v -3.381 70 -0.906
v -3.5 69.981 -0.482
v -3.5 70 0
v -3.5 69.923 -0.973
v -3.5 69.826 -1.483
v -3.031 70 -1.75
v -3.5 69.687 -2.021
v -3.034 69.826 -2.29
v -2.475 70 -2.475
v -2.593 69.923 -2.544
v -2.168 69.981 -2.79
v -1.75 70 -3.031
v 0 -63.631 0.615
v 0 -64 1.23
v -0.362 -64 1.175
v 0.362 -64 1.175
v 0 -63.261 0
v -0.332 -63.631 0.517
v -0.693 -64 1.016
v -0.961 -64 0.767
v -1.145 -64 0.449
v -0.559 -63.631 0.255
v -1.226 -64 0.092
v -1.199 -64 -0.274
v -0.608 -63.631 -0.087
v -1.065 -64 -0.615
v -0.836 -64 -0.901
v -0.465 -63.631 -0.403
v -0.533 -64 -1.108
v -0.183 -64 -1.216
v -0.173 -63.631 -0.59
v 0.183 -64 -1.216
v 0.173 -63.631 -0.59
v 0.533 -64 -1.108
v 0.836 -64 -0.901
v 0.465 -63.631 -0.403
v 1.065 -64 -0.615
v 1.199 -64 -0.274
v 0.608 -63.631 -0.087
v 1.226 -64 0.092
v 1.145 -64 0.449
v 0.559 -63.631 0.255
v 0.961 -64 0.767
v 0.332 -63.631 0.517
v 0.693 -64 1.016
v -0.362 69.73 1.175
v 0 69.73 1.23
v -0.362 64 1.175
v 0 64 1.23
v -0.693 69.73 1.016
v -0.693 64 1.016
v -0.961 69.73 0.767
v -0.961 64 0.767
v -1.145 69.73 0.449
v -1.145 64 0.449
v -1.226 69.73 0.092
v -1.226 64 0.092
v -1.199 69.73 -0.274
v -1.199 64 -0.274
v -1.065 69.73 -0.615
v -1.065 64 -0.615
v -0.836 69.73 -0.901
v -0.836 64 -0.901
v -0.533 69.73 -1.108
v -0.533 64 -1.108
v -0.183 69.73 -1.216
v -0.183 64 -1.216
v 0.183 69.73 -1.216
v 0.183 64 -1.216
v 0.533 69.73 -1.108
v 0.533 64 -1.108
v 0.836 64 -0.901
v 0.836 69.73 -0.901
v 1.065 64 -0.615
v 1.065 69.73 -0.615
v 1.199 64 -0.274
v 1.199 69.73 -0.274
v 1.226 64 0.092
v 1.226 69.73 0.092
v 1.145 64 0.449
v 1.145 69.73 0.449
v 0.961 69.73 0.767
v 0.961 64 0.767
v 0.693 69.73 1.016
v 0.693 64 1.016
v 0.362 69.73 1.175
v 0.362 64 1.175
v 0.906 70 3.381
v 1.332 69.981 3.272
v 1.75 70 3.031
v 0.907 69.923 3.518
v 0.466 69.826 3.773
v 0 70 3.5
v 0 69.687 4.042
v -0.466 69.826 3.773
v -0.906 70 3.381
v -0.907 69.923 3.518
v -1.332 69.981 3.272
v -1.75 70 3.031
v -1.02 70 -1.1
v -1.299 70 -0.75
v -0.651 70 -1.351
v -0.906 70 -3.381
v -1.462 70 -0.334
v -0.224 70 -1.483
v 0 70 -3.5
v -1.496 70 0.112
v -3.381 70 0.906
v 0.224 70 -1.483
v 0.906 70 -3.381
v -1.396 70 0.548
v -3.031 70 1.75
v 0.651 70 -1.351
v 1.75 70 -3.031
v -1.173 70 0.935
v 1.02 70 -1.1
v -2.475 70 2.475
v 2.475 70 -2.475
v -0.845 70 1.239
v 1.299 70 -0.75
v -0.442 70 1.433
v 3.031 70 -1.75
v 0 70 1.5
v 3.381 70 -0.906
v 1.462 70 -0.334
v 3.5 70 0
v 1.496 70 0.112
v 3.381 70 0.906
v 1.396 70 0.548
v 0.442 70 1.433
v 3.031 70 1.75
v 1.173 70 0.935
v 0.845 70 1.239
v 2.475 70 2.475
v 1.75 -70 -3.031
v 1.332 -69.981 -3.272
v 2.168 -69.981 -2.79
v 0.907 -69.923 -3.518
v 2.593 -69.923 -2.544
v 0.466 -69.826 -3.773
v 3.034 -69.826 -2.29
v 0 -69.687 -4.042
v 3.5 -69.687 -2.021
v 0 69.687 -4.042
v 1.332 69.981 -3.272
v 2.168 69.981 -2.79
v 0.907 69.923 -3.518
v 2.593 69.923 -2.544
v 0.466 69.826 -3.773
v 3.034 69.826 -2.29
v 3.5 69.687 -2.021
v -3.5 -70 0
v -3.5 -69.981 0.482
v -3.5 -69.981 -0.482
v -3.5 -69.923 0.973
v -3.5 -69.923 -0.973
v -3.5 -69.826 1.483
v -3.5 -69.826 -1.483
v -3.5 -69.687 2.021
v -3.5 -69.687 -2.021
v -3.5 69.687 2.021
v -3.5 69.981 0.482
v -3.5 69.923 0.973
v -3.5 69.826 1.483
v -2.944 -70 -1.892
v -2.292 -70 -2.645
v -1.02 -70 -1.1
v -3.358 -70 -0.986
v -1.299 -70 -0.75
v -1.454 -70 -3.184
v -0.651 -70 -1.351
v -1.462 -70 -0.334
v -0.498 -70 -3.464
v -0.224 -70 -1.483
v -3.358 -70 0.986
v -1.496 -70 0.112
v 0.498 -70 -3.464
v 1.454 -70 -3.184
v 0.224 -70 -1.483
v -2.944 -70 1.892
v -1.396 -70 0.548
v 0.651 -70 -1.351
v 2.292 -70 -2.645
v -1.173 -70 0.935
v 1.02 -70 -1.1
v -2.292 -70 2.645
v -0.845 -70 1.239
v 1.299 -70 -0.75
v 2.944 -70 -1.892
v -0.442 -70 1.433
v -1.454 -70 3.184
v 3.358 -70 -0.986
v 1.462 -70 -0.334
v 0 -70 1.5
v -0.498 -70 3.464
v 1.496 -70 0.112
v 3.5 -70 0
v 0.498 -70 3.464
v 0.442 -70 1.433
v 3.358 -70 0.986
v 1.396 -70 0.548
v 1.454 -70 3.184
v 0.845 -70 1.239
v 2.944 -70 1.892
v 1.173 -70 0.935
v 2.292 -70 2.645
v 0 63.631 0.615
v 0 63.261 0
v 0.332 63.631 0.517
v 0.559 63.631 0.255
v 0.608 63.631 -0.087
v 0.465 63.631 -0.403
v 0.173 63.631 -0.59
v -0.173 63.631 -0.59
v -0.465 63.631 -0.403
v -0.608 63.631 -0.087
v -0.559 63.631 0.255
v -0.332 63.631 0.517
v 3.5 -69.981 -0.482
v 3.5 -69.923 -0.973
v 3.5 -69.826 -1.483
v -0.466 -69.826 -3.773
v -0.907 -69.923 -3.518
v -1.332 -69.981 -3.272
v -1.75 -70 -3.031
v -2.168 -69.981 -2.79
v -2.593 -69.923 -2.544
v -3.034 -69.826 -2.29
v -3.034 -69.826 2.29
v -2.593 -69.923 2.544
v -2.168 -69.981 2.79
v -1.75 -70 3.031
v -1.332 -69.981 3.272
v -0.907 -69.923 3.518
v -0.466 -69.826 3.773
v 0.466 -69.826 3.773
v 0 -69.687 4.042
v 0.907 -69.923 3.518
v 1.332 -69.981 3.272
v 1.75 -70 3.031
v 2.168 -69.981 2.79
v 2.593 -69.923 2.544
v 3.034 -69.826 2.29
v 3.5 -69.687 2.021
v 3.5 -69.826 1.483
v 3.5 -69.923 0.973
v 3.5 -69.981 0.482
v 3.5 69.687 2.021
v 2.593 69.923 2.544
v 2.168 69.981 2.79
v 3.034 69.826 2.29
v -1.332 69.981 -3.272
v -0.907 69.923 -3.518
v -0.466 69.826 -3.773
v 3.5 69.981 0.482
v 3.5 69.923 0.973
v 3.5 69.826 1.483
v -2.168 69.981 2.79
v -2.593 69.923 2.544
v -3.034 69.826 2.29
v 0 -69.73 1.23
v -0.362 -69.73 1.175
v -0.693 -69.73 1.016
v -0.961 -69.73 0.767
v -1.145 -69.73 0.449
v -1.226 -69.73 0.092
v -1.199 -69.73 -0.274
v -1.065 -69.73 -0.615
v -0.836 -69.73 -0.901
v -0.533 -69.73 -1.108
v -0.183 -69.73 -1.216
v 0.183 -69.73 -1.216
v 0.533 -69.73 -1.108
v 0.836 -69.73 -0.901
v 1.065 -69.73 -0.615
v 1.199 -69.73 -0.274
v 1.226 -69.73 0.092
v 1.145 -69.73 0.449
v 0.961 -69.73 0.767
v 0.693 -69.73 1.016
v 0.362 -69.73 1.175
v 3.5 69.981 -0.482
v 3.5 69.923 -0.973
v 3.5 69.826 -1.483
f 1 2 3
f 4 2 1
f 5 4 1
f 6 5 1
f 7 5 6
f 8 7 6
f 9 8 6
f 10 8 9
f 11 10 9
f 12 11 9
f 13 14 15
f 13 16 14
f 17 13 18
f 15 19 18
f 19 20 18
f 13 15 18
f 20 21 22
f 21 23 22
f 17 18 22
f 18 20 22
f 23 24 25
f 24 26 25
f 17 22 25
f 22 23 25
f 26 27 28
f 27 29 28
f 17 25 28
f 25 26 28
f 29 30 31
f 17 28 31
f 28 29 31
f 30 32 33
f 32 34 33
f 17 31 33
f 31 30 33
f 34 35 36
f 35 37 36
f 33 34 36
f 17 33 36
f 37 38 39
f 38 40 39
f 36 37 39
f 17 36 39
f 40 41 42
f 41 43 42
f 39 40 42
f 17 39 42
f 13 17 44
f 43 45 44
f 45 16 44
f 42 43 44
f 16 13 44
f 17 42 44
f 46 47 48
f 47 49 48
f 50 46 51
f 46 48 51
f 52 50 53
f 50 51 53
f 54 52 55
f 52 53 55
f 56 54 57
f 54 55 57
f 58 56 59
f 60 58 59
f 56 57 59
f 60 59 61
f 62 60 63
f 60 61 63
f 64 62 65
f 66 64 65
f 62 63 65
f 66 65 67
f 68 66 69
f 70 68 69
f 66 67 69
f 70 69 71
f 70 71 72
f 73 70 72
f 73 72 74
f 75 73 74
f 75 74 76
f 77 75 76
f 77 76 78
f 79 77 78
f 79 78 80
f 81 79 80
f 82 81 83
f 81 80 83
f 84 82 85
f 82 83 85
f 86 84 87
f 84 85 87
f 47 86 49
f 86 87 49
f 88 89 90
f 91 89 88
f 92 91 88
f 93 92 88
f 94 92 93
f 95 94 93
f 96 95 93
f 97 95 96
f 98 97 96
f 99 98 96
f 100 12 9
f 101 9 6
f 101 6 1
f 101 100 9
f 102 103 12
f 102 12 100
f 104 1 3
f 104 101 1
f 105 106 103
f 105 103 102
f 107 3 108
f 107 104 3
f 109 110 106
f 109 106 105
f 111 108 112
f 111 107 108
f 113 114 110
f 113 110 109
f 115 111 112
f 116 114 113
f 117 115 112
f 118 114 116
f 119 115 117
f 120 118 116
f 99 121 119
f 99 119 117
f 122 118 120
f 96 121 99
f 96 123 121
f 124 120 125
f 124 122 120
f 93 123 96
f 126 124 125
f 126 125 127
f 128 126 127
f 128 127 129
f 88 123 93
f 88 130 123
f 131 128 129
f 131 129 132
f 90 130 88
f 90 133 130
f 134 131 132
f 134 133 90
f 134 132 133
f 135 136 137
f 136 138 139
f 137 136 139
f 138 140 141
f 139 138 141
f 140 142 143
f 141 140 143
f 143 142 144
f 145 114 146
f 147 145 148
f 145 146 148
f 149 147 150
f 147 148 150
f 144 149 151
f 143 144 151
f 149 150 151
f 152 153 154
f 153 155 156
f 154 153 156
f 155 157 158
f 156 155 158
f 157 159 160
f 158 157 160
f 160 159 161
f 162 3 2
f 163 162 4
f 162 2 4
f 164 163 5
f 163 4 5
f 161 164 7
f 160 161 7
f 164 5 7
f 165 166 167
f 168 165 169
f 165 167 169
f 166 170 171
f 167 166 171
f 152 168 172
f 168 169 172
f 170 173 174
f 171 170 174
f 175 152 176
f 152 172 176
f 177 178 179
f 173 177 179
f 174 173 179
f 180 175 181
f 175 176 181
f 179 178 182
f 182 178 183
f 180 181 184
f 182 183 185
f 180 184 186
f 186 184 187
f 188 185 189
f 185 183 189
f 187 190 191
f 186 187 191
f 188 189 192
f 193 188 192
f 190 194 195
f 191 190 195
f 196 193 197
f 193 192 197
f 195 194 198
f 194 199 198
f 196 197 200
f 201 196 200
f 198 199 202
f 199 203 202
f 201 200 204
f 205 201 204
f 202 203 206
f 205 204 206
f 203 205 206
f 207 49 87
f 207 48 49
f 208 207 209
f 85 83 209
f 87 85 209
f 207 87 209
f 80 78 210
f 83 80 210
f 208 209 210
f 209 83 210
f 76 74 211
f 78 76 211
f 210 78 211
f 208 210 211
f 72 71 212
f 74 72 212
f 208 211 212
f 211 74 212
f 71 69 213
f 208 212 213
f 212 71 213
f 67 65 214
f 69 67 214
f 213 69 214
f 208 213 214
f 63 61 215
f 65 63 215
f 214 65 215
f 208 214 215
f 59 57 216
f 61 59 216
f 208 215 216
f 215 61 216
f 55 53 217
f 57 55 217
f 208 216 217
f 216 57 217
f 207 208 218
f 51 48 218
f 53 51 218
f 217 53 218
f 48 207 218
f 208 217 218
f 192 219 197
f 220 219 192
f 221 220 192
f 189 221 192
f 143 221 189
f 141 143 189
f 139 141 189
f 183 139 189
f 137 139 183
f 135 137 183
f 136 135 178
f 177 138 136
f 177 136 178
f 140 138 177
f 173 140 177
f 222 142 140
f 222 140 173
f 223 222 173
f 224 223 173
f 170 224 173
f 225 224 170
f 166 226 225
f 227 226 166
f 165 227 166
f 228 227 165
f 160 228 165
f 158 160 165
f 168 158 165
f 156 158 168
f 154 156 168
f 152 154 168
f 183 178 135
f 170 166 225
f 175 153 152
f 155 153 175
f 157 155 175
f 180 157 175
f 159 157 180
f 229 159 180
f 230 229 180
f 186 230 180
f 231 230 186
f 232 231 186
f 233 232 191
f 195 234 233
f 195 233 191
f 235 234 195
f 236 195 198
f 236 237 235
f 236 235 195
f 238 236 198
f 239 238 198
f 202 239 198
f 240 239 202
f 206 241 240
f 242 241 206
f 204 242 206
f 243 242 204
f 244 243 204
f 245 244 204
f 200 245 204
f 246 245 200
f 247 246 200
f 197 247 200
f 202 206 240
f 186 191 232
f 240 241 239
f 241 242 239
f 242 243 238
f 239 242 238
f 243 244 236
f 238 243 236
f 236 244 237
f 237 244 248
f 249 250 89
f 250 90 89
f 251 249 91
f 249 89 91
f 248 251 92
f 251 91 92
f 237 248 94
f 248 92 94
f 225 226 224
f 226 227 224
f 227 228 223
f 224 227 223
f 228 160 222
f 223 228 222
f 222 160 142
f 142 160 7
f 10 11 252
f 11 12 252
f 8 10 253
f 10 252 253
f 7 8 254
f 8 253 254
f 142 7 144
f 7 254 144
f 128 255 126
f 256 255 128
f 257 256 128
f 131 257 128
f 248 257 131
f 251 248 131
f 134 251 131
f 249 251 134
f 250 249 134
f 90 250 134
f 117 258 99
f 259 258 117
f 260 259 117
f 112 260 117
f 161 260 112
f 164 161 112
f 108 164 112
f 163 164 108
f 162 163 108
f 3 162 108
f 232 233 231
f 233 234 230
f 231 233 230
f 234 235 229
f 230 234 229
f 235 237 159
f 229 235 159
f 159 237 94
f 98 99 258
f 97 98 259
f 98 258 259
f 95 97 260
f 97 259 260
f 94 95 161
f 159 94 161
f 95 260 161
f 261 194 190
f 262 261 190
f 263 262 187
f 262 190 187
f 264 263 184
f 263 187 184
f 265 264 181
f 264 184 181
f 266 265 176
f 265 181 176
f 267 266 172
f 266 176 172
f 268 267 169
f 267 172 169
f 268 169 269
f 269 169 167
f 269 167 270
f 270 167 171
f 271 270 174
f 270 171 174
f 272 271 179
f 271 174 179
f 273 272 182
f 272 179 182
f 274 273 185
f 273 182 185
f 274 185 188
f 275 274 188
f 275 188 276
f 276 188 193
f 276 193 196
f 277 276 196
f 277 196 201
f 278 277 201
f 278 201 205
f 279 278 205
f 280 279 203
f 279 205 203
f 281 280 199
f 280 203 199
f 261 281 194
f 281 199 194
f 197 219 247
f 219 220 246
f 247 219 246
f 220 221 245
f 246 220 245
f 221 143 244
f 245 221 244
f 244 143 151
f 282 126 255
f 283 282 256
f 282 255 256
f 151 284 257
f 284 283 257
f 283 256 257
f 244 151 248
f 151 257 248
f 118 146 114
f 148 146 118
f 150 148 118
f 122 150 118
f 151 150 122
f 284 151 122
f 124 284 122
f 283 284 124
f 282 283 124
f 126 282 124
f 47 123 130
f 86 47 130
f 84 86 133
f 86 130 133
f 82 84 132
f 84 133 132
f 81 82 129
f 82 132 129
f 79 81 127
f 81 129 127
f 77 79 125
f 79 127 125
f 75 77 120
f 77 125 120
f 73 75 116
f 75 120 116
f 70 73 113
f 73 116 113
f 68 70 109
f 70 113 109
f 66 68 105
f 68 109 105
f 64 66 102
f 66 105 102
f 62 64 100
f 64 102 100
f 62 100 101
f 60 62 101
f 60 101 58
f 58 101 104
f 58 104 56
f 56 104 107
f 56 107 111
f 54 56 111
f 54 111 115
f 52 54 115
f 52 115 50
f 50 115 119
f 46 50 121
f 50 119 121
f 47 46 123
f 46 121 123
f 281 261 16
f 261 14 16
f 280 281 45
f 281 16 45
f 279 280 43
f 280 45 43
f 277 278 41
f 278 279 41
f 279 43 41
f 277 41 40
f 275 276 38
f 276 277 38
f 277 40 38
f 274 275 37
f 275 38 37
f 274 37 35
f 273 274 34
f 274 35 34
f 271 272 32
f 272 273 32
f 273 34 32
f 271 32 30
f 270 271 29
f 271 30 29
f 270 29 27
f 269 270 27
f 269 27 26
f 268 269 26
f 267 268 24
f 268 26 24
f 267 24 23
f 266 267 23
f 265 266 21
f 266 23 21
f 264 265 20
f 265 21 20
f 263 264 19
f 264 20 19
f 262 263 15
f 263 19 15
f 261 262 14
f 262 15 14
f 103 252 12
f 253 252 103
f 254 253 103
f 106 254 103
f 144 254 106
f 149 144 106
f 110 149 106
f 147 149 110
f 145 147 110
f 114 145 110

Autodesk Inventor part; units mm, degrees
ref_plane "YZ Plane" through (0, 0, 0) normal (1, 0, 0) x (0, 1, 0)
ref_plane "XZ Plane" through (0, 0, 0) normal (0, 1, 0) x (-1, 0, 0)
ref_plane "XY Plane" through (0, 0, 0) normal (0, 0, 1) x (1, 0, 0)
sketch "スケッチ1" plane through (0, 0, 0) normal (1, 0, 0) x (0, 1, 0)
  line L0 (-70, 0) -> (70, 0)
  line L1 (0, 0) -> (0, 4.0415) construction
  line L2 (-69.6874, 4.0415) -> (-70, 3.5)
  line L3 (-70, 3.5) -> (-70, 0)
  line L4 (-69.6874, 4.0415) -> (69.6874, 4.0415)
  line L5 (69.6874, 4.0415) -> (70, 3.5)
  line L6 (70, 3.5) -> (70, 0)
  dimension "d1" = 3.5
  dimension "d2" = 4.0415
  dimension "d3" = 30
  dimension "d4" = 140
revolve "回転1" add sketch "スケッチ1" angle 360 about axis through (0, -70, 0) along (0, 1, 0)
sketch "スケッチ2" plane through (0, 70, 0) normal (0, 1, 0) x (1, 0, 0)
  circle A0 centre (0, 0) radius 4.0415 projected
  line L0 (0, -4.0415) -> (-3.5, -2.0207)
  line L1 (-3.5, -2.0207) -> (-3.5, 2.0207)
  line L2 (-3.5, 2.0207) -> (0, 4.0415)
  line L3 (0, 4.0415) -> (3.5, 2.0207)
  line L4 (3.5, 2.0207) -> (3.5, -2.0207)
  line L5 (3.5, -2.0207) -> (0, -4.0415)
  point P0 (0, 0)
  point P1 (0, 0)
  point P2 (3.5, -2.0207)
  point P3 (3.5, 2.0207)
  point P4 (3.5, 2.0207)
  point P5 (0, 4.0415)
  point P6 (0, 4.0415)
  point P7 (-3.5, 2.0207)
  point P8 (-3.5, 2.0207)
  point P9 (-3.5, -2.0207)
  point P10 (-3.5, -2.0207)
extrude "押し出し1" cut sketch "スケッチ2" against normal through all contours A0 L4 | L3 A0 | A0 L5 | L2 A0 | A0 L0 | L1 A0
hole "穴1" at (0, 70, 0) direction (0, -1, 0) diameter 2.459 depth 6 tip angle 118 countersink diameter 3 countersink angle 90 thread size "M3x0.5" class "6H" standard "ISO Metric profile"
mirror "ミラー1" about plane through (0, 0, 0) normal (0, 1, 0) of "穴1"
equation "\"d2\" = 1.1547 * d1"
properties part number "ABLSBF7-140-M3-N3" material "アルミニウム 2014-T4"
